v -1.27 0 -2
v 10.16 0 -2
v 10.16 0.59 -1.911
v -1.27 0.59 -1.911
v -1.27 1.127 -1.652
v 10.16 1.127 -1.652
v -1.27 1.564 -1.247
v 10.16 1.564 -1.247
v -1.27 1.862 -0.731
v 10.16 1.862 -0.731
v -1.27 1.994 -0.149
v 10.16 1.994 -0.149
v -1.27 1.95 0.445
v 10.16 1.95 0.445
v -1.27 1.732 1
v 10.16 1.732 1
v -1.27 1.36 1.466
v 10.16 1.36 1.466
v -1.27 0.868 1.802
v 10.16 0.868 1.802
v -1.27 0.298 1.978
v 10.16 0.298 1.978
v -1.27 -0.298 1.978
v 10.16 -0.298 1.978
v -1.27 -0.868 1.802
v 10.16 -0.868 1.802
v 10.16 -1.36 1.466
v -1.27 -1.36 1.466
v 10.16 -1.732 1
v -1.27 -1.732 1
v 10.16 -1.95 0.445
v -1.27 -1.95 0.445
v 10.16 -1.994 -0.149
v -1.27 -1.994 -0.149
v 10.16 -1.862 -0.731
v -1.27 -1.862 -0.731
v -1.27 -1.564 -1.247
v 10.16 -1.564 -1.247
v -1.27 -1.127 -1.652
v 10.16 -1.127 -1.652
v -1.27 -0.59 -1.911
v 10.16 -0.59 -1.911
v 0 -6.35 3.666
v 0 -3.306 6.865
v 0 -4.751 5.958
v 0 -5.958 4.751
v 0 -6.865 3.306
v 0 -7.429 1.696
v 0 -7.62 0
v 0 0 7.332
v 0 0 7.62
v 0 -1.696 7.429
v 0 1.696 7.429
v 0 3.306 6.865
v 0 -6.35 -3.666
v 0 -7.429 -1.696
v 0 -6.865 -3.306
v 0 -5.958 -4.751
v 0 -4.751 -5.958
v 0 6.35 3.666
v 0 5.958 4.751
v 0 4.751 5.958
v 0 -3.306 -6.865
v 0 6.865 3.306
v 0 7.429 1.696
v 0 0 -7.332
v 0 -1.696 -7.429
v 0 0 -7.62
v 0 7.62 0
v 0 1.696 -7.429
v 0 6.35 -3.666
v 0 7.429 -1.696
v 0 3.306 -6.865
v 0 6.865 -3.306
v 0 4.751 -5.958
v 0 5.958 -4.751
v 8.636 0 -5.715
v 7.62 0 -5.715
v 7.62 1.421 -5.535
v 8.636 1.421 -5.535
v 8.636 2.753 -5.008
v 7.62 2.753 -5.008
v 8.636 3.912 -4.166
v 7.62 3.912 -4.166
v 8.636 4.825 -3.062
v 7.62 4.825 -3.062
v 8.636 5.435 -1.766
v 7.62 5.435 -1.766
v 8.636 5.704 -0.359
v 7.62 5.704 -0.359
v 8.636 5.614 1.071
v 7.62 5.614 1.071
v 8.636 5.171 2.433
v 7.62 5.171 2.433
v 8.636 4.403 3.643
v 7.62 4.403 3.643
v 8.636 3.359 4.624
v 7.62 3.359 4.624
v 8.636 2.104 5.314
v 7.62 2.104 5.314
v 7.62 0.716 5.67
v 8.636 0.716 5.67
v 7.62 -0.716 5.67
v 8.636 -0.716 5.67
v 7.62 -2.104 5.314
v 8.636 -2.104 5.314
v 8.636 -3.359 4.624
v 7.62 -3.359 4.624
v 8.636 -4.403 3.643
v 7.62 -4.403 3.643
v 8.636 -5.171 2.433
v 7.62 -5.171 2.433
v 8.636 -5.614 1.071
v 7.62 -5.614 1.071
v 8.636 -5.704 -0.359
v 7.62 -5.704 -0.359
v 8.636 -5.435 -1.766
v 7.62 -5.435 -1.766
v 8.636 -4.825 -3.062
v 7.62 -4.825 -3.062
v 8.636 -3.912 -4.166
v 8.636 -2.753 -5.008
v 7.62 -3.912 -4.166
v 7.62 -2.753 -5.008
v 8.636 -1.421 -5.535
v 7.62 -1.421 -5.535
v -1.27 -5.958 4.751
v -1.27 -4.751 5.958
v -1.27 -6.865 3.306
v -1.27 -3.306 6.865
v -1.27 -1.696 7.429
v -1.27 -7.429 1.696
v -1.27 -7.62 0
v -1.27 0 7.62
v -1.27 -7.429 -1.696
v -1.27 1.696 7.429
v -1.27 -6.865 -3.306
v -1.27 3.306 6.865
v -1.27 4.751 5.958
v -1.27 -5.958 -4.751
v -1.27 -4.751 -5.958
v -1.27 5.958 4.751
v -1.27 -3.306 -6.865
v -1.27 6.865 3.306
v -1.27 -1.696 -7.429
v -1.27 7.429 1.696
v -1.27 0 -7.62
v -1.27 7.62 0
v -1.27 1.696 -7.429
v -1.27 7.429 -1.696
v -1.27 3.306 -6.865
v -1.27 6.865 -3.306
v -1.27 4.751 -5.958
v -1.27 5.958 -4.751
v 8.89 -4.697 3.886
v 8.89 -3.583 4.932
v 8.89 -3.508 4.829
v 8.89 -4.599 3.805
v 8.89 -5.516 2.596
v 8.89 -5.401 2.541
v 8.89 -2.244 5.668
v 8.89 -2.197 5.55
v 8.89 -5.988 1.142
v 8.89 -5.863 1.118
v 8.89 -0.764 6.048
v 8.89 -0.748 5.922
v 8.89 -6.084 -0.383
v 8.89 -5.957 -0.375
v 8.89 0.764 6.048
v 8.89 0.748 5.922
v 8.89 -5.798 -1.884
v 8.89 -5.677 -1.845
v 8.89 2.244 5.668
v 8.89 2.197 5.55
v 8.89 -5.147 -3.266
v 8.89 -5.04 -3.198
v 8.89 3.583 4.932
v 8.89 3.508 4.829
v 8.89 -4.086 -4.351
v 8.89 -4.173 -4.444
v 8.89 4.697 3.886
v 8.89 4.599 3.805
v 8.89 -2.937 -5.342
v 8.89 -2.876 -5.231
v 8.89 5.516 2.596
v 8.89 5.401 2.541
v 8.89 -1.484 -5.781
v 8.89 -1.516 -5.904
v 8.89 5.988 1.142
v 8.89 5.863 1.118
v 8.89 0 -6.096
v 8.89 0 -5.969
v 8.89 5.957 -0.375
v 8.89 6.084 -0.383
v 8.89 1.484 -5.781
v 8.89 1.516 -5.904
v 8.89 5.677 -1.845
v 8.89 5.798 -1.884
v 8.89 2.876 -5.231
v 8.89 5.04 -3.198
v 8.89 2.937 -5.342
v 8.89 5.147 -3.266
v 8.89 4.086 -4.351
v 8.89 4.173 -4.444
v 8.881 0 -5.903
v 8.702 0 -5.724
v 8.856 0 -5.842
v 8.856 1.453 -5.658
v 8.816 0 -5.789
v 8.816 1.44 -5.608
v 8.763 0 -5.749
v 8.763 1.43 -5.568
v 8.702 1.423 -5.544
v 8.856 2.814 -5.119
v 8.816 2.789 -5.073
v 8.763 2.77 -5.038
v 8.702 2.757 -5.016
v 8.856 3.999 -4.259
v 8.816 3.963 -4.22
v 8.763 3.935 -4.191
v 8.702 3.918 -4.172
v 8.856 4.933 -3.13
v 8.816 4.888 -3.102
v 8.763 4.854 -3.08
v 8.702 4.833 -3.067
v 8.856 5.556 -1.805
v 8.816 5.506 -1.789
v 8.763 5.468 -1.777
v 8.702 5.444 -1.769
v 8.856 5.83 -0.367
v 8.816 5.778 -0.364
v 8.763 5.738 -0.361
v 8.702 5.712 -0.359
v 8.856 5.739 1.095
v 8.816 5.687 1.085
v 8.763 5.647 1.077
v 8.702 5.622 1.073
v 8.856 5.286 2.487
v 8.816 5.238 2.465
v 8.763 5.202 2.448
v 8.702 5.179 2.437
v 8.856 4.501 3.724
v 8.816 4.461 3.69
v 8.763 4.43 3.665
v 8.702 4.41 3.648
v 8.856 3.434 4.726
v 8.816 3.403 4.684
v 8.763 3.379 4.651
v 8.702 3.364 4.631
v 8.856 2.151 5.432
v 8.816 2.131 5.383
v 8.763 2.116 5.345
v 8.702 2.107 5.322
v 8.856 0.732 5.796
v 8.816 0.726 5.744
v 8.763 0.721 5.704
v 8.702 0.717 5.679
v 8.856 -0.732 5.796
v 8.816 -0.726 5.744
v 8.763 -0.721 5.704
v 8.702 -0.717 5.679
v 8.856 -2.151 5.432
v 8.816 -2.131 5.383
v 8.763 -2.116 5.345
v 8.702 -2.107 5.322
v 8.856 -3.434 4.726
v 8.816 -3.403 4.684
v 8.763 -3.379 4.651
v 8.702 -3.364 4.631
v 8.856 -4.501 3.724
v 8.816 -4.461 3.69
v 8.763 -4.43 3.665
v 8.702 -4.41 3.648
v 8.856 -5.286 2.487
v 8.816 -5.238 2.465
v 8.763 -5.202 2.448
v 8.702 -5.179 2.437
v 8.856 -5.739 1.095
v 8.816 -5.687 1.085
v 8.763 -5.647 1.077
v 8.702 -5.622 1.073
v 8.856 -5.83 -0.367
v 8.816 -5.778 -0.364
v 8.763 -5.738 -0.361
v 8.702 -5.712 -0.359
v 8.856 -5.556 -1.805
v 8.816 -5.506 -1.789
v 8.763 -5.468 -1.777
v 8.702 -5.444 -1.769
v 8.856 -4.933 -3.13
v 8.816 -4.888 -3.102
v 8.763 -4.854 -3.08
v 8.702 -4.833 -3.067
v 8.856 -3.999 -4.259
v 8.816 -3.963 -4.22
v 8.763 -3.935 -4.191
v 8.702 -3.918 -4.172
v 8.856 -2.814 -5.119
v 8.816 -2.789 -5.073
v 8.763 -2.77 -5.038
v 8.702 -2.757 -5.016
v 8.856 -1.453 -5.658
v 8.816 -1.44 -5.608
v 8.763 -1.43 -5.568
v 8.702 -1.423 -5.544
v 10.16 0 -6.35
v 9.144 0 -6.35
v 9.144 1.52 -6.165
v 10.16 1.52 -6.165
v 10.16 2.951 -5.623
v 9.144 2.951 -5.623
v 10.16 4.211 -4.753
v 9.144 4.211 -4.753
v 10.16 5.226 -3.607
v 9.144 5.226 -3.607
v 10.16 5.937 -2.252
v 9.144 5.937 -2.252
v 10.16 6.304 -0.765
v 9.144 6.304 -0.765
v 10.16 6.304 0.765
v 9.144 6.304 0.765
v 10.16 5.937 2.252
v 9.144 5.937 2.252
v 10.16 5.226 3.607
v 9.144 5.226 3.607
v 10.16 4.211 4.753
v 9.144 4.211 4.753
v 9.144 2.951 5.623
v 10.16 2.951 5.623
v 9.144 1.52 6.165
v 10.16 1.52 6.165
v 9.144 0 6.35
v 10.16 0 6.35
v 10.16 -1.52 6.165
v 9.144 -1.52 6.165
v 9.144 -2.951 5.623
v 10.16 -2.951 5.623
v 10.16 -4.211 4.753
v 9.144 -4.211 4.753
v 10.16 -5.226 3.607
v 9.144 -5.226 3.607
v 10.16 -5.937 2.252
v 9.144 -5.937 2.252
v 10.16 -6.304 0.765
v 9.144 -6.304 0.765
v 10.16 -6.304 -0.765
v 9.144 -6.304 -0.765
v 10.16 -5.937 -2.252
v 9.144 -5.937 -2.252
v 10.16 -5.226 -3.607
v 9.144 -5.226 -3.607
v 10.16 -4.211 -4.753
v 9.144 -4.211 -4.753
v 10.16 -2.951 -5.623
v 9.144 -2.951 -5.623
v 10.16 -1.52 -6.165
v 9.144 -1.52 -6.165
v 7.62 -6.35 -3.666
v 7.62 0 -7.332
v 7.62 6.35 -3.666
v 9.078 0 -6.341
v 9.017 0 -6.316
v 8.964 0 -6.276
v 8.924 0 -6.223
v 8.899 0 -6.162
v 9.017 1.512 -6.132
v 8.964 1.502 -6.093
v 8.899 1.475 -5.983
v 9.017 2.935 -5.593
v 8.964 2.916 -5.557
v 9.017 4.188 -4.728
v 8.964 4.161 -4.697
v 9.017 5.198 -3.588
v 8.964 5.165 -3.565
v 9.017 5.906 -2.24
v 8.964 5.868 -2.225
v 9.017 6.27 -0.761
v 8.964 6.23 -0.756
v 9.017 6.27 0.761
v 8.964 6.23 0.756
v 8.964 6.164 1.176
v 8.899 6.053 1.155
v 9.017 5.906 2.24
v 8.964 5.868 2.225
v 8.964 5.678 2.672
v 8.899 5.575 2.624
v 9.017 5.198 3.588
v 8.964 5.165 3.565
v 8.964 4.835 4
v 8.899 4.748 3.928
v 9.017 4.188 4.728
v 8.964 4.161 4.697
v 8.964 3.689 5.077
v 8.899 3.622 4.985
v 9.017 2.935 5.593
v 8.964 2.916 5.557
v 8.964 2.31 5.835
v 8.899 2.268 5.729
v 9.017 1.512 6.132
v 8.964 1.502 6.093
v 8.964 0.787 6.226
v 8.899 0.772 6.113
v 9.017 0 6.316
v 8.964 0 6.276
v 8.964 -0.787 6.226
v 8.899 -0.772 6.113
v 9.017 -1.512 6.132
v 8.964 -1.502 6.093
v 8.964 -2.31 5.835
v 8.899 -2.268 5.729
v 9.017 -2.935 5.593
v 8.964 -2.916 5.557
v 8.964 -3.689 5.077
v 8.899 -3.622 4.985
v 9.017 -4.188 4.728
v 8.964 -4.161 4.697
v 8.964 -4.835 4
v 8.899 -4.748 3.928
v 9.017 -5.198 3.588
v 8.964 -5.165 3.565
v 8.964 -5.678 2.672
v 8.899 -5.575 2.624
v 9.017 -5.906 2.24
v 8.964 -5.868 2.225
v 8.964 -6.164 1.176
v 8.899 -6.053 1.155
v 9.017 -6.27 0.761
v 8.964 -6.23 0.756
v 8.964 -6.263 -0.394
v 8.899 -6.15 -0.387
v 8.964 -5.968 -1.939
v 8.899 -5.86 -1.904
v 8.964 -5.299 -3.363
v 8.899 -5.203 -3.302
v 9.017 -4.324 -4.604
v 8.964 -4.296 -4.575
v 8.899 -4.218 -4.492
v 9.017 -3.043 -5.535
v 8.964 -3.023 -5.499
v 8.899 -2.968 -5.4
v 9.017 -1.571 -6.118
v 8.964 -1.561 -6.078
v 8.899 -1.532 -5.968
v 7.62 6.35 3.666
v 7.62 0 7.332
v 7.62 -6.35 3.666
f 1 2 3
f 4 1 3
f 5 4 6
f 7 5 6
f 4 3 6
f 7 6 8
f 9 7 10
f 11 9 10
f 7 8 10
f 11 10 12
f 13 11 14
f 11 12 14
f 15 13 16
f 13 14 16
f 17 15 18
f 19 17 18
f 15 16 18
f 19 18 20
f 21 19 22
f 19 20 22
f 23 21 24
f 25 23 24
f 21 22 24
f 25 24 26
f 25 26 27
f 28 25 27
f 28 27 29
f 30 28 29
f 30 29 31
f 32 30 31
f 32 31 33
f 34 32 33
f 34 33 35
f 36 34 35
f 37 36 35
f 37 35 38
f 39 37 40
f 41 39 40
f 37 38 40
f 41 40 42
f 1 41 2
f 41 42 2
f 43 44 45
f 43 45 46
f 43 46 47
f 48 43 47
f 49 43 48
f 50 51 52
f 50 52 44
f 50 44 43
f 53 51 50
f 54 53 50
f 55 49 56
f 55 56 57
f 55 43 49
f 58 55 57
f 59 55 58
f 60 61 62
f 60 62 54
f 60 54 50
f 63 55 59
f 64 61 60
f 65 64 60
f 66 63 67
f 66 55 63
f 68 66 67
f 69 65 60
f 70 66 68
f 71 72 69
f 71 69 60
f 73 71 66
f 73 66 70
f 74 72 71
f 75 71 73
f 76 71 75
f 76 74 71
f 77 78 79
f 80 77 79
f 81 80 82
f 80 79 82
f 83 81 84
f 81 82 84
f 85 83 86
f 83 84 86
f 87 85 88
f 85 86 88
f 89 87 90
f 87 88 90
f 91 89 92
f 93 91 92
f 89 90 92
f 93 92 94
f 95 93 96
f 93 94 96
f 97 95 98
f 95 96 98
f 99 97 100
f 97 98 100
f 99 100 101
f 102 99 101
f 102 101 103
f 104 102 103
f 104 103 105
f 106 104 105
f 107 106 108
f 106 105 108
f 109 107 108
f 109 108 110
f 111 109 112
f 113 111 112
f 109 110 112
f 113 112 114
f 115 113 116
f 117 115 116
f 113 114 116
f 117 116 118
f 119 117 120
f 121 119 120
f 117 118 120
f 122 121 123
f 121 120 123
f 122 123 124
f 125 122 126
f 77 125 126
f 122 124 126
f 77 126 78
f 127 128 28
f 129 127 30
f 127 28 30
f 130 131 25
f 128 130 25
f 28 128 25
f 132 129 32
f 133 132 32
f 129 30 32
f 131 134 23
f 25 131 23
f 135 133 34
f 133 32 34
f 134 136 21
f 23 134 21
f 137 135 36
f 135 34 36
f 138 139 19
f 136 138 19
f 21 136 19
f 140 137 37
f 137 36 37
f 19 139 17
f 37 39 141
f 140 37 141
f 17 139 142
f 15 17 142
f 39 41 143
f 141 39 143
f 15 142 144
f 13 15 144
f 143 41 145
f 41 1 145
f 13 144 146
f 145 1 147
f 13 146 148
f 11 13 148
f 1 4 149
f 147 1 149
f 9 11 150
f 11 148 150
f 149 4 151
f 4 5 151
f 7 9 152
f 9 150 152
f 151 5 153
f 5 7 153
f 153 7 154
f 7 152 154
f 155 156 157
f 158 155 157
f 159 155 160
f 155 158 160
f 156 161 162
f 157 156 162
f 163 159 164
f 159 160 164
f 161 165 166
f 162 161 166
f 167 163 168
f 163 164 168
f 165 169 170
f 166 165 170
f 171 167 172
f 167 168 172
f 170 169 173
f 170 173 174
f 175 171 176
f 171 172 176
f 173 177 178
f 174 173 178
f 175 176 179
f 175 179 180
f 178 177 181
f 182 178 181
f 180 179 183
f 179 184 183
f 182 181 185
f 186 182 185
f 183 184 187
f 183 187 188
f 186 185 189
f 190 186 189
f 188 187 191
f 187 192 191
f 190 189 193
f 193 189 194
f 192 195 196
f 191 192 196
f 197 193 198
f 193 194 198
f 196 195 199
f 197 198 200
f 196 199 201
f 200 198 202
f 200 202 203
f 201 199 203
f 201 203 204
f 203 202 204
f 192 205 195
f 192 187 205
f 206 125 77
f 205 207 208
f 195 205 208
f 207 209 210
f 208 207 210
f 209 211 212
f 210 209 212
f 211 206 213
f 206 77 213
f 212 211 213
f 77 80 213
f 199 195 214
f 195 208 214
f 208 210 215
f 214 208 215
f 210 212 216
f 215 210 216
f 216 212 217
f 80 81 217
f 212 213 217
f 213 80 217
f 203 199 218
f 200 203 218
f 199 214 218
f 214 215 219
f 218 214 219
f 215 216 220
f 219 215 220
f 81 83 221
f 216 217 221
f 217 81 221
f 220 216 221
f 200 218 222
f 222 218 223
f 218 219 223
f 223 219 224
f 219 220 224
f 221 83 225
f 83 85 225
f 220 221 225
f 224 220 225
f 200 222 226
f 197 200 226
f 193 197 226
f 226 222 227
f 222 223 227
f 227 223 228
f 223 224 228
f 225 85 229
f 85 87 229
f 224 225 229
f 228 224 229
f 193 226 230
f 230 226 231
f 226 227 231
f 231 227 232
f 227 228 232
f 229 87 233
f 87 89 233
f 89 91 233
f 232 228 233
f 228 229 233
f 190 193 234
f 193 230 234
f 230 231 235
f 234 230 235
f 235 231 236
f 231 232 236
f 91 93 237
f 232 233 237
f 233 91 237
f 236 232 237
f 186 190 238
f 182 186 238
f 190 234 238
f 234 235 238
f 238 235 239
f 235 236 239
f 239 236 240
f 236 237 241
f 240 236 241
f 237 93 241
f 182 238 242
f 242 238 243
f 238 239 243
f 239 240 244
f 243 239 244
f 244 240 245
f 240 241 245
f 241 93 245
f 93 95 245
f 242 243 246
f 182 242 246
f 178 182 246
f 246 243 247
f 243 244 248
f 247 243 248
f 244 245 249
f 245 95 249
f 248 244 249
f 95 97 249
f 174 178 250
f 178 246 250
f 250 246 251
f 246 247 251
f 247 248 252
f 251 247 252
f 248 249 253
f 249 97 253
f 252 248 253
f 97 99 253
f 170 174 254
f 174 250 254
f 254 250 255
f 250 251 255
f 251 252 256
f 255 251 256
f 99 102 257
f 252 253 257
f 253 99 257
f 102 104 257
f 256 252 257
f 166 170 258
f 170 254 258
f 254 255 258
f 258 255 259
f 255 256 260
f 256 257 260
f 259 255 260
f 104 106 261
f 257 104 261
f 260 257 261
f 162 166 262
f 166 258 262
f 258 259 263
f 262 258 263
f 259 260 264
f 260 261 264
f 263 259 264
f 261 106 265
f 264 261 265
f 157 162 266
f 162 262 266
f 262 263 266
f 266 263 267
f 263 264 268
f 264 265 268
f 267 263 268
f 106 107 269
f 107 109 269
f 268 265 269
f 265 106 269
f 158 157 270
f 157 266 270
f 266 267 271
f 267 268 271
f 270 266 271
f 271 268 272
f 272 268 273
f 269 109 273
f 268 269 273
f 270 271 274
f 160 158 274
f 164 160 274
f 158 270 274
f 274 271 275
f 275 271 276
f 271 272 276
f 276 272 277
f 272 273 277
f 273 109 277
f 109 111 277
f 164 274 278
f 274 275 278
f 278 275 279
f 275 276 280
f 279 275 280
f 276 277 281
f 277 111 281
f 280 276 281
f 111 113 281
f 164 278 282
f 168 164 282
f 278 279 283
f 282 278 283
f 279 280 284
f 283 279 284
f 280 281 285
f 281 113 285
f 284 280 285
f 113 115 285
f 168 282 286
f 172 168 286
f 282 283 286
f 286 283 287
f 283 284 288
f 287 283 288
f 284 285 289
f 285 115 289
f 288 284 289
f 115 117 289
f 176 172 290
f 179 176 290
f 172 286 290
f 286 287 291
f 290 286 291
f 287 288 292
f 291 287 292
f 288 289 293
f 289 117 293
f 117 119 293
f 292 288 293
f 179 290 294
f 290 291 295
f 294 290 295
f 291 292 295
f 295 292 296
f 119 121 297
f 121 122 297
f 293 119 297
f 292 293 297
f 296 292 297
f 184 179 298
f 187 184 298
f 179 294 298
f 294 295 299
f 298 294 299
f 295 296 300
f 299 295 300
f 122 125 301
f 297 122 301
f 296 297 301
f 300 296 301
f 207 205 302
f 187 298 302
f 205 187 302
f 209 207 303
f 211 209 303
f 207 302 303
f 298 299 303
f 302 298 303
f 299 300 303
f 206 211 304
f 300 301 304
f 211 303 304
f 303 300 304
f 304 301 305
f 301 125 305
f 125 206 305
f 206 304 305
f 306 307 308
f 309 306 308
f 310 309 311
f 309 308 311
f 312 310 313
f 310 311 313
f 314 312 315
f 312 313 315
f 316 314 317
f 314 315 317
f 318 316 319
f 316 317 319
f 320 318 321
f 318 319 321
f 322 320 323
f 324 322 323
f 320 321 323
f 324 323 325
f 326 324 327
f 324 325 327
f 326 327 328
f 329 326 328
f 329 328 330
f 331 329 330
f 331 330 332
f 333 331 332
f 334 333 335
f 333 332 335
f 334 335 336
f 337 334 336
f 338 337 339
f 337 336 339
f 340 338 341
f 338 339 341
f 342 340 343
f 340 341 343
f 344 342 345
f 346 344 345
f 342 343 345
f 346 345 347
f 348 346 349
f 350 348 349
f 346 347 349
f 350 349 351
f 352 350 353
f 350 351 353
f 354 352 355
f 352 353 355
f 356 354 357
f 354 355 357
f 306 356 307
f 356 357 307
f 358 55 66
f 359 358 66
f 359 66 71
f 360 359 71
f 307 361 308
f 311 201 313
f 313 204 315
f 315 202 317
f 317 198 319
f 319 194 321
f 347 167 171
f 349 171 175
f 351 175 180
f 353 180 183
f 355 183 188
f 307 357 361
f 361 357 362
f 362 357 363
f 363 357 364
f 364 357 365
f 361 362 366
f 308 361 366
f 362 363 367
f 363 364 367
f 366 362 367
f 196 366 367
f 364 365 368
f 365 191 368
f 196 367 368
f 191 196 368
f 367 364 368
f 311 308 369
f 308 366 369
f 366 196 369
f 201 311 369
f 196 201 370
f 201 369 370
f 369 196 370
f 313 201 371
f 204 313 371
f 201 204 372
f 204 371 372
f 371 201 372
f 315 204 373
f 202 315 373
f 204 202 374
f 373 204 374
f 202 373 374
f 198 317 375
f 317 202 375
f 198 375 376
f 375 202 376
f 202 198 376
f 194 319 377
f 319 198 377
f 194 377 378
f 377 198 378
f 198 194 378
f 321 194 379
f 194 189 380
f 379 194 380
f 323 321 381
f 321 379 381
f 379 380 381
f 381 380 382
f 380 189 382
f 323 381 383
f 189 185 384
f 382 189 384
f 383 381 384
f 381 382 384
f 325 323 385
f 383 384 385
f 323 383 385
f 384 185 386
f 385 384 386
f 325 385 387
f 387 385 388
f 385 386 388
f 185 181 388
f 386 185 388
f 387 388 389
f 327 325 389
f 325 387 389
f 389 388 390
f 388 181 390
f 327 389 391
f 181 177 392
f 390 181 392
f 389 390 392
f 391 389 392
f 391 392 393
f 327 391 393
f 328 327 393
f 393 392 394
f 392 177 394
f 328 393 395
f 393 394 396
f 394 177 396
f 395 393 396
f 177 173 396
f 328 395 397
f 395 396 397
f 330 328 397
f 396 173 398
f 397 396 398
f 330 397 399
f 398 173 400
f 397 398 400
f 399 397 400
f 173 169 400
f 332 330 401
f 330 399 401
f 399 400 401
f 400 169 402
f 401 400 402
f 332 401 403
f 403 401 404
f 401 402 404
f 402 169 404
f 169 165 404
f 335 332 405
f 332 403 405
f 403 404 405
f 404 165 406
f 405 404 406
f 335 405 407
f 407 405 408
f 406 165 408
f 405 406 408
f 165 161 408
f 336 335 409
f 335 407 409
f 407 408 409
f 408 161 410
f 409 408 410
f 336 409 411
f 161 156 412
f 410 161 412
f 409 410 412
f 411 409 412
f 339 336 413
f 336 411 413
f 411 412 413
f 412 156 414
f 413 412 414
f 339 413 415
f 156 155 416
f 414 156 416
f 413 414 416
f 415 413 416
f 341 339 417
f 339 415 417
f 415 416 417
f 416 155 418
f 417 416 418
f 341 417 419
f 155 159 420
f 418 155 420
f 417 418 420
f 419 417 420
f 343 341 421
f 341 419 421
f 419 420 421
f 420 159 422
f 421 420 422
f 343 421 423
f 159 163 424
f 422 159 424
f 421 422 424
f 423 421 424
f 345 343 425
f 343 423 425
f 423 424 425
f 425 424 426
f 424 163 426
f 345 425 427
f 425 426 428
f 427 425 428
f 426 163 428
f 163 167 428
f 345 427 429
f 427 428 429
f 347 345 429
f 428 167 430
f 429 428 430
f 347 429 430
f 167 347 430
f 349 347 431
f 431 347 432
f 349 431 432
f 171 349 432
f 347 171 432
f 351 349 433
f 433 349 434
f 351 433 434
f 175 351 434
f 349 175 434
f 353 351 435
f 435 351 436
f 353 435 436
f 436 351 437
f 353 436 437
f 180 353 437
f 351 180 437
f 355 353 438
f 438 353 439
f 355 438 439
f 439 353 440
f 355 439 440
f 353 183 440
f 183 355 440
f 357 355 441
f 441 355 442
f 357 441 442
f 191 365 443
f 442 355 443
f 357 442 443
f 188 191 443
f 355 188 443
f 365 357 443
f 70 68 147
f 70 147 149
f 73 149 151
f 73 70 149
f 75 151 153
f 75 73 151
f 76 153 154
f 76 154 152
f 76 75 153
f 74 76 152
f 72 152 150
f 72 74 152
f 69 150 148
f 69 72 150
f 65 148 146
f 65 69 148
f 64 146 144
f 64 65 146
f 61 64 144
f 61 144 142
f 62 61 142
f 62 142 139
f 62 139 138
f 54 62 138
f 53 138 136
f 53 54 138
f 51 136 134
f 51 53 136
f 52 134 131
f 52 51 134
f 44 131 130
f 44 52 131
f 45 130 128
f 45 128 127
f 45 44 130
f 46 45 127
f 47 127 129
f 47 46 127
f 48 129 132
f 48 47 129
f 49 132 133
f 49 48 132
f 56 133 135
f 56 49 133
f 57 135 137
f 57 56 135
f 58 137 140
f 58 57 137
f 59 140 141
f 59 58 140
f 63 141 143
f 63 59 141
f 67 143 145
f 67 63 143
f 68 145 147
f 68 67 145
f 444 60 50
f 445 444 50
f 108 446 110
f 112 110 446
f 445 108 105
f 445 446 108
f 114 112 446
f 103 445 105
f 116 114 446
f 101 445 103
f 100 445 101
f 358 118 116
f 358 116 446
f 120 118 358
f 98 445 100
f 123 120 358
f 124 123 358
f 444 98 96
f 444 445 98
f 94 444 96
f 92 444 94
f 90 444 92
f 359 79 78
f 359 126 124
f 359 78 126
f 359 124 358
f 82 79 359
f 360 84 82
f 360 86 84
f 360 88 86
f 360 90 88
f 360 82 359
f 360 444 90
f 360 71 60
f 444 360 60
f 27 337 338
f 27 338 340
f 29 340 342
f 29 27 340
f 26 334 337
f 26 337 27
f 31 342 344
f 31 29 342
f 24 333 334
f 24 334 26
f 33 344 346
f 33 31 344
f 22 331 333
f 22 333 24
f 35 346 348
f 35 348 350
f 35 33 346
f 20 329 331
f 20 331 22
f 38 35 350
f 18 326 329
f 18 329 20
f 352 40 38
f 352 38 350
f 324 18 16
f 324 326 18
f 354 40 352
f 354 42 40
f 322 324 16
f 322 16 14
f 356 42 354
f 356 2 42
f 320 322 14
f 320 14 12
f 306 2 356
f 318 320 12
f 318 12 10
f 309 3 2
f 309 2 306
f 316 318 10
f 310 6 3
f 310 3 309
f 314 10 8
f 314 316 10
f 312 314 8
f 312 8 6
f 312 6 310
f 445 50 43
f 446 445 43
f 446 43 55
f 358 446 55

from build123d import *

# Parameters (mm, degrees)
SKETCH2_R           = 7.62
BOSS_EXTRUDE1_DEPTH = 1.27
BOSS_EXTRUDE2_DEPTH = 7.62
SKETCH4_R           = 5.715
BOSS_EXTRUDE3_DEPTH = 1.27
SKETCH5_R           = 6.35
BOSS_EXTRUDE4_DEPTH = 1.27
FILLET1_R           = 0.254
SKETCH6_R           = 2
CUT_EXTRUDE1_DEPTH  = 11.43


with BuildPart() as part:
    # Sketch2 → Boss-Extrude1 (new body)
    with BuildSketch(Plane(origin=(0, 0, 0), x_dir=(0, 0, -1), z_dir=(1, 0, 0))):
        Circle(SKETCH2_R)
    extrude(amount=-BOSS_EXTRUDE1_DEPTH)

    # Sketch3 → Boss-Extrude2 (add)
    with BuildSketch(Plane(origin=(0, 0, 0), x_dir=(0, 0, -1), z_dir=(1, 0, 0))):
        Polygon((-3.666174209, 6.35), (-7.332348419, 0), (-3.666174209, -6.35), (3.666174209, -6.35), (7.332348419, 0), (3.666174209, 6.35), align=None)
    extrude(amount=BOSS_EXTRUDE2_DEPTH)

    # Sketch4 → Boss-Extrude3 (add)
    with BuildSketch(Plane(origin=(7.62, 0, 0), x_dir=(0, 0, -1), z_dir=(1, 0, 0))):
        Circle(SKETCH4_R)
    extrude(amount=BOSS_EXTRUDE3_DEPTH)

    # Sketch5 → Boss-Extrude4 (add)
    with BuildSketch(Plane(origin=(8.89, 0, 0), x_dir=(0, 0, -1), z_dir=(1, 0, 0))):
        Circle(SKETCH5_R)
    extrude(amount=BOSS_EXTRUDE4_DEPTH)

    # Fillet1
    fillet1_edges = [part.edges().sort_by_distance(p)[0] for p in [
        (8.89, 0, 5.715),
        (8.89, 0, 6.35),
    ]]
    fillet(fillet1_edges, radius=FILLET1_R)

    # Sketch6 → Cut-Extrude1 (cut)
    with BuildSketch(Plane(origin=(10.16, 0, 0), x_dir=(0, 0, -1), z_dir=(1, 0, 0))):
        Circle(SKETCH6_R)
    extrude(amount=-CUT_EXTRUDE1_DEPTH, mode=Mode.SUBTRACT)


solid = part.part
